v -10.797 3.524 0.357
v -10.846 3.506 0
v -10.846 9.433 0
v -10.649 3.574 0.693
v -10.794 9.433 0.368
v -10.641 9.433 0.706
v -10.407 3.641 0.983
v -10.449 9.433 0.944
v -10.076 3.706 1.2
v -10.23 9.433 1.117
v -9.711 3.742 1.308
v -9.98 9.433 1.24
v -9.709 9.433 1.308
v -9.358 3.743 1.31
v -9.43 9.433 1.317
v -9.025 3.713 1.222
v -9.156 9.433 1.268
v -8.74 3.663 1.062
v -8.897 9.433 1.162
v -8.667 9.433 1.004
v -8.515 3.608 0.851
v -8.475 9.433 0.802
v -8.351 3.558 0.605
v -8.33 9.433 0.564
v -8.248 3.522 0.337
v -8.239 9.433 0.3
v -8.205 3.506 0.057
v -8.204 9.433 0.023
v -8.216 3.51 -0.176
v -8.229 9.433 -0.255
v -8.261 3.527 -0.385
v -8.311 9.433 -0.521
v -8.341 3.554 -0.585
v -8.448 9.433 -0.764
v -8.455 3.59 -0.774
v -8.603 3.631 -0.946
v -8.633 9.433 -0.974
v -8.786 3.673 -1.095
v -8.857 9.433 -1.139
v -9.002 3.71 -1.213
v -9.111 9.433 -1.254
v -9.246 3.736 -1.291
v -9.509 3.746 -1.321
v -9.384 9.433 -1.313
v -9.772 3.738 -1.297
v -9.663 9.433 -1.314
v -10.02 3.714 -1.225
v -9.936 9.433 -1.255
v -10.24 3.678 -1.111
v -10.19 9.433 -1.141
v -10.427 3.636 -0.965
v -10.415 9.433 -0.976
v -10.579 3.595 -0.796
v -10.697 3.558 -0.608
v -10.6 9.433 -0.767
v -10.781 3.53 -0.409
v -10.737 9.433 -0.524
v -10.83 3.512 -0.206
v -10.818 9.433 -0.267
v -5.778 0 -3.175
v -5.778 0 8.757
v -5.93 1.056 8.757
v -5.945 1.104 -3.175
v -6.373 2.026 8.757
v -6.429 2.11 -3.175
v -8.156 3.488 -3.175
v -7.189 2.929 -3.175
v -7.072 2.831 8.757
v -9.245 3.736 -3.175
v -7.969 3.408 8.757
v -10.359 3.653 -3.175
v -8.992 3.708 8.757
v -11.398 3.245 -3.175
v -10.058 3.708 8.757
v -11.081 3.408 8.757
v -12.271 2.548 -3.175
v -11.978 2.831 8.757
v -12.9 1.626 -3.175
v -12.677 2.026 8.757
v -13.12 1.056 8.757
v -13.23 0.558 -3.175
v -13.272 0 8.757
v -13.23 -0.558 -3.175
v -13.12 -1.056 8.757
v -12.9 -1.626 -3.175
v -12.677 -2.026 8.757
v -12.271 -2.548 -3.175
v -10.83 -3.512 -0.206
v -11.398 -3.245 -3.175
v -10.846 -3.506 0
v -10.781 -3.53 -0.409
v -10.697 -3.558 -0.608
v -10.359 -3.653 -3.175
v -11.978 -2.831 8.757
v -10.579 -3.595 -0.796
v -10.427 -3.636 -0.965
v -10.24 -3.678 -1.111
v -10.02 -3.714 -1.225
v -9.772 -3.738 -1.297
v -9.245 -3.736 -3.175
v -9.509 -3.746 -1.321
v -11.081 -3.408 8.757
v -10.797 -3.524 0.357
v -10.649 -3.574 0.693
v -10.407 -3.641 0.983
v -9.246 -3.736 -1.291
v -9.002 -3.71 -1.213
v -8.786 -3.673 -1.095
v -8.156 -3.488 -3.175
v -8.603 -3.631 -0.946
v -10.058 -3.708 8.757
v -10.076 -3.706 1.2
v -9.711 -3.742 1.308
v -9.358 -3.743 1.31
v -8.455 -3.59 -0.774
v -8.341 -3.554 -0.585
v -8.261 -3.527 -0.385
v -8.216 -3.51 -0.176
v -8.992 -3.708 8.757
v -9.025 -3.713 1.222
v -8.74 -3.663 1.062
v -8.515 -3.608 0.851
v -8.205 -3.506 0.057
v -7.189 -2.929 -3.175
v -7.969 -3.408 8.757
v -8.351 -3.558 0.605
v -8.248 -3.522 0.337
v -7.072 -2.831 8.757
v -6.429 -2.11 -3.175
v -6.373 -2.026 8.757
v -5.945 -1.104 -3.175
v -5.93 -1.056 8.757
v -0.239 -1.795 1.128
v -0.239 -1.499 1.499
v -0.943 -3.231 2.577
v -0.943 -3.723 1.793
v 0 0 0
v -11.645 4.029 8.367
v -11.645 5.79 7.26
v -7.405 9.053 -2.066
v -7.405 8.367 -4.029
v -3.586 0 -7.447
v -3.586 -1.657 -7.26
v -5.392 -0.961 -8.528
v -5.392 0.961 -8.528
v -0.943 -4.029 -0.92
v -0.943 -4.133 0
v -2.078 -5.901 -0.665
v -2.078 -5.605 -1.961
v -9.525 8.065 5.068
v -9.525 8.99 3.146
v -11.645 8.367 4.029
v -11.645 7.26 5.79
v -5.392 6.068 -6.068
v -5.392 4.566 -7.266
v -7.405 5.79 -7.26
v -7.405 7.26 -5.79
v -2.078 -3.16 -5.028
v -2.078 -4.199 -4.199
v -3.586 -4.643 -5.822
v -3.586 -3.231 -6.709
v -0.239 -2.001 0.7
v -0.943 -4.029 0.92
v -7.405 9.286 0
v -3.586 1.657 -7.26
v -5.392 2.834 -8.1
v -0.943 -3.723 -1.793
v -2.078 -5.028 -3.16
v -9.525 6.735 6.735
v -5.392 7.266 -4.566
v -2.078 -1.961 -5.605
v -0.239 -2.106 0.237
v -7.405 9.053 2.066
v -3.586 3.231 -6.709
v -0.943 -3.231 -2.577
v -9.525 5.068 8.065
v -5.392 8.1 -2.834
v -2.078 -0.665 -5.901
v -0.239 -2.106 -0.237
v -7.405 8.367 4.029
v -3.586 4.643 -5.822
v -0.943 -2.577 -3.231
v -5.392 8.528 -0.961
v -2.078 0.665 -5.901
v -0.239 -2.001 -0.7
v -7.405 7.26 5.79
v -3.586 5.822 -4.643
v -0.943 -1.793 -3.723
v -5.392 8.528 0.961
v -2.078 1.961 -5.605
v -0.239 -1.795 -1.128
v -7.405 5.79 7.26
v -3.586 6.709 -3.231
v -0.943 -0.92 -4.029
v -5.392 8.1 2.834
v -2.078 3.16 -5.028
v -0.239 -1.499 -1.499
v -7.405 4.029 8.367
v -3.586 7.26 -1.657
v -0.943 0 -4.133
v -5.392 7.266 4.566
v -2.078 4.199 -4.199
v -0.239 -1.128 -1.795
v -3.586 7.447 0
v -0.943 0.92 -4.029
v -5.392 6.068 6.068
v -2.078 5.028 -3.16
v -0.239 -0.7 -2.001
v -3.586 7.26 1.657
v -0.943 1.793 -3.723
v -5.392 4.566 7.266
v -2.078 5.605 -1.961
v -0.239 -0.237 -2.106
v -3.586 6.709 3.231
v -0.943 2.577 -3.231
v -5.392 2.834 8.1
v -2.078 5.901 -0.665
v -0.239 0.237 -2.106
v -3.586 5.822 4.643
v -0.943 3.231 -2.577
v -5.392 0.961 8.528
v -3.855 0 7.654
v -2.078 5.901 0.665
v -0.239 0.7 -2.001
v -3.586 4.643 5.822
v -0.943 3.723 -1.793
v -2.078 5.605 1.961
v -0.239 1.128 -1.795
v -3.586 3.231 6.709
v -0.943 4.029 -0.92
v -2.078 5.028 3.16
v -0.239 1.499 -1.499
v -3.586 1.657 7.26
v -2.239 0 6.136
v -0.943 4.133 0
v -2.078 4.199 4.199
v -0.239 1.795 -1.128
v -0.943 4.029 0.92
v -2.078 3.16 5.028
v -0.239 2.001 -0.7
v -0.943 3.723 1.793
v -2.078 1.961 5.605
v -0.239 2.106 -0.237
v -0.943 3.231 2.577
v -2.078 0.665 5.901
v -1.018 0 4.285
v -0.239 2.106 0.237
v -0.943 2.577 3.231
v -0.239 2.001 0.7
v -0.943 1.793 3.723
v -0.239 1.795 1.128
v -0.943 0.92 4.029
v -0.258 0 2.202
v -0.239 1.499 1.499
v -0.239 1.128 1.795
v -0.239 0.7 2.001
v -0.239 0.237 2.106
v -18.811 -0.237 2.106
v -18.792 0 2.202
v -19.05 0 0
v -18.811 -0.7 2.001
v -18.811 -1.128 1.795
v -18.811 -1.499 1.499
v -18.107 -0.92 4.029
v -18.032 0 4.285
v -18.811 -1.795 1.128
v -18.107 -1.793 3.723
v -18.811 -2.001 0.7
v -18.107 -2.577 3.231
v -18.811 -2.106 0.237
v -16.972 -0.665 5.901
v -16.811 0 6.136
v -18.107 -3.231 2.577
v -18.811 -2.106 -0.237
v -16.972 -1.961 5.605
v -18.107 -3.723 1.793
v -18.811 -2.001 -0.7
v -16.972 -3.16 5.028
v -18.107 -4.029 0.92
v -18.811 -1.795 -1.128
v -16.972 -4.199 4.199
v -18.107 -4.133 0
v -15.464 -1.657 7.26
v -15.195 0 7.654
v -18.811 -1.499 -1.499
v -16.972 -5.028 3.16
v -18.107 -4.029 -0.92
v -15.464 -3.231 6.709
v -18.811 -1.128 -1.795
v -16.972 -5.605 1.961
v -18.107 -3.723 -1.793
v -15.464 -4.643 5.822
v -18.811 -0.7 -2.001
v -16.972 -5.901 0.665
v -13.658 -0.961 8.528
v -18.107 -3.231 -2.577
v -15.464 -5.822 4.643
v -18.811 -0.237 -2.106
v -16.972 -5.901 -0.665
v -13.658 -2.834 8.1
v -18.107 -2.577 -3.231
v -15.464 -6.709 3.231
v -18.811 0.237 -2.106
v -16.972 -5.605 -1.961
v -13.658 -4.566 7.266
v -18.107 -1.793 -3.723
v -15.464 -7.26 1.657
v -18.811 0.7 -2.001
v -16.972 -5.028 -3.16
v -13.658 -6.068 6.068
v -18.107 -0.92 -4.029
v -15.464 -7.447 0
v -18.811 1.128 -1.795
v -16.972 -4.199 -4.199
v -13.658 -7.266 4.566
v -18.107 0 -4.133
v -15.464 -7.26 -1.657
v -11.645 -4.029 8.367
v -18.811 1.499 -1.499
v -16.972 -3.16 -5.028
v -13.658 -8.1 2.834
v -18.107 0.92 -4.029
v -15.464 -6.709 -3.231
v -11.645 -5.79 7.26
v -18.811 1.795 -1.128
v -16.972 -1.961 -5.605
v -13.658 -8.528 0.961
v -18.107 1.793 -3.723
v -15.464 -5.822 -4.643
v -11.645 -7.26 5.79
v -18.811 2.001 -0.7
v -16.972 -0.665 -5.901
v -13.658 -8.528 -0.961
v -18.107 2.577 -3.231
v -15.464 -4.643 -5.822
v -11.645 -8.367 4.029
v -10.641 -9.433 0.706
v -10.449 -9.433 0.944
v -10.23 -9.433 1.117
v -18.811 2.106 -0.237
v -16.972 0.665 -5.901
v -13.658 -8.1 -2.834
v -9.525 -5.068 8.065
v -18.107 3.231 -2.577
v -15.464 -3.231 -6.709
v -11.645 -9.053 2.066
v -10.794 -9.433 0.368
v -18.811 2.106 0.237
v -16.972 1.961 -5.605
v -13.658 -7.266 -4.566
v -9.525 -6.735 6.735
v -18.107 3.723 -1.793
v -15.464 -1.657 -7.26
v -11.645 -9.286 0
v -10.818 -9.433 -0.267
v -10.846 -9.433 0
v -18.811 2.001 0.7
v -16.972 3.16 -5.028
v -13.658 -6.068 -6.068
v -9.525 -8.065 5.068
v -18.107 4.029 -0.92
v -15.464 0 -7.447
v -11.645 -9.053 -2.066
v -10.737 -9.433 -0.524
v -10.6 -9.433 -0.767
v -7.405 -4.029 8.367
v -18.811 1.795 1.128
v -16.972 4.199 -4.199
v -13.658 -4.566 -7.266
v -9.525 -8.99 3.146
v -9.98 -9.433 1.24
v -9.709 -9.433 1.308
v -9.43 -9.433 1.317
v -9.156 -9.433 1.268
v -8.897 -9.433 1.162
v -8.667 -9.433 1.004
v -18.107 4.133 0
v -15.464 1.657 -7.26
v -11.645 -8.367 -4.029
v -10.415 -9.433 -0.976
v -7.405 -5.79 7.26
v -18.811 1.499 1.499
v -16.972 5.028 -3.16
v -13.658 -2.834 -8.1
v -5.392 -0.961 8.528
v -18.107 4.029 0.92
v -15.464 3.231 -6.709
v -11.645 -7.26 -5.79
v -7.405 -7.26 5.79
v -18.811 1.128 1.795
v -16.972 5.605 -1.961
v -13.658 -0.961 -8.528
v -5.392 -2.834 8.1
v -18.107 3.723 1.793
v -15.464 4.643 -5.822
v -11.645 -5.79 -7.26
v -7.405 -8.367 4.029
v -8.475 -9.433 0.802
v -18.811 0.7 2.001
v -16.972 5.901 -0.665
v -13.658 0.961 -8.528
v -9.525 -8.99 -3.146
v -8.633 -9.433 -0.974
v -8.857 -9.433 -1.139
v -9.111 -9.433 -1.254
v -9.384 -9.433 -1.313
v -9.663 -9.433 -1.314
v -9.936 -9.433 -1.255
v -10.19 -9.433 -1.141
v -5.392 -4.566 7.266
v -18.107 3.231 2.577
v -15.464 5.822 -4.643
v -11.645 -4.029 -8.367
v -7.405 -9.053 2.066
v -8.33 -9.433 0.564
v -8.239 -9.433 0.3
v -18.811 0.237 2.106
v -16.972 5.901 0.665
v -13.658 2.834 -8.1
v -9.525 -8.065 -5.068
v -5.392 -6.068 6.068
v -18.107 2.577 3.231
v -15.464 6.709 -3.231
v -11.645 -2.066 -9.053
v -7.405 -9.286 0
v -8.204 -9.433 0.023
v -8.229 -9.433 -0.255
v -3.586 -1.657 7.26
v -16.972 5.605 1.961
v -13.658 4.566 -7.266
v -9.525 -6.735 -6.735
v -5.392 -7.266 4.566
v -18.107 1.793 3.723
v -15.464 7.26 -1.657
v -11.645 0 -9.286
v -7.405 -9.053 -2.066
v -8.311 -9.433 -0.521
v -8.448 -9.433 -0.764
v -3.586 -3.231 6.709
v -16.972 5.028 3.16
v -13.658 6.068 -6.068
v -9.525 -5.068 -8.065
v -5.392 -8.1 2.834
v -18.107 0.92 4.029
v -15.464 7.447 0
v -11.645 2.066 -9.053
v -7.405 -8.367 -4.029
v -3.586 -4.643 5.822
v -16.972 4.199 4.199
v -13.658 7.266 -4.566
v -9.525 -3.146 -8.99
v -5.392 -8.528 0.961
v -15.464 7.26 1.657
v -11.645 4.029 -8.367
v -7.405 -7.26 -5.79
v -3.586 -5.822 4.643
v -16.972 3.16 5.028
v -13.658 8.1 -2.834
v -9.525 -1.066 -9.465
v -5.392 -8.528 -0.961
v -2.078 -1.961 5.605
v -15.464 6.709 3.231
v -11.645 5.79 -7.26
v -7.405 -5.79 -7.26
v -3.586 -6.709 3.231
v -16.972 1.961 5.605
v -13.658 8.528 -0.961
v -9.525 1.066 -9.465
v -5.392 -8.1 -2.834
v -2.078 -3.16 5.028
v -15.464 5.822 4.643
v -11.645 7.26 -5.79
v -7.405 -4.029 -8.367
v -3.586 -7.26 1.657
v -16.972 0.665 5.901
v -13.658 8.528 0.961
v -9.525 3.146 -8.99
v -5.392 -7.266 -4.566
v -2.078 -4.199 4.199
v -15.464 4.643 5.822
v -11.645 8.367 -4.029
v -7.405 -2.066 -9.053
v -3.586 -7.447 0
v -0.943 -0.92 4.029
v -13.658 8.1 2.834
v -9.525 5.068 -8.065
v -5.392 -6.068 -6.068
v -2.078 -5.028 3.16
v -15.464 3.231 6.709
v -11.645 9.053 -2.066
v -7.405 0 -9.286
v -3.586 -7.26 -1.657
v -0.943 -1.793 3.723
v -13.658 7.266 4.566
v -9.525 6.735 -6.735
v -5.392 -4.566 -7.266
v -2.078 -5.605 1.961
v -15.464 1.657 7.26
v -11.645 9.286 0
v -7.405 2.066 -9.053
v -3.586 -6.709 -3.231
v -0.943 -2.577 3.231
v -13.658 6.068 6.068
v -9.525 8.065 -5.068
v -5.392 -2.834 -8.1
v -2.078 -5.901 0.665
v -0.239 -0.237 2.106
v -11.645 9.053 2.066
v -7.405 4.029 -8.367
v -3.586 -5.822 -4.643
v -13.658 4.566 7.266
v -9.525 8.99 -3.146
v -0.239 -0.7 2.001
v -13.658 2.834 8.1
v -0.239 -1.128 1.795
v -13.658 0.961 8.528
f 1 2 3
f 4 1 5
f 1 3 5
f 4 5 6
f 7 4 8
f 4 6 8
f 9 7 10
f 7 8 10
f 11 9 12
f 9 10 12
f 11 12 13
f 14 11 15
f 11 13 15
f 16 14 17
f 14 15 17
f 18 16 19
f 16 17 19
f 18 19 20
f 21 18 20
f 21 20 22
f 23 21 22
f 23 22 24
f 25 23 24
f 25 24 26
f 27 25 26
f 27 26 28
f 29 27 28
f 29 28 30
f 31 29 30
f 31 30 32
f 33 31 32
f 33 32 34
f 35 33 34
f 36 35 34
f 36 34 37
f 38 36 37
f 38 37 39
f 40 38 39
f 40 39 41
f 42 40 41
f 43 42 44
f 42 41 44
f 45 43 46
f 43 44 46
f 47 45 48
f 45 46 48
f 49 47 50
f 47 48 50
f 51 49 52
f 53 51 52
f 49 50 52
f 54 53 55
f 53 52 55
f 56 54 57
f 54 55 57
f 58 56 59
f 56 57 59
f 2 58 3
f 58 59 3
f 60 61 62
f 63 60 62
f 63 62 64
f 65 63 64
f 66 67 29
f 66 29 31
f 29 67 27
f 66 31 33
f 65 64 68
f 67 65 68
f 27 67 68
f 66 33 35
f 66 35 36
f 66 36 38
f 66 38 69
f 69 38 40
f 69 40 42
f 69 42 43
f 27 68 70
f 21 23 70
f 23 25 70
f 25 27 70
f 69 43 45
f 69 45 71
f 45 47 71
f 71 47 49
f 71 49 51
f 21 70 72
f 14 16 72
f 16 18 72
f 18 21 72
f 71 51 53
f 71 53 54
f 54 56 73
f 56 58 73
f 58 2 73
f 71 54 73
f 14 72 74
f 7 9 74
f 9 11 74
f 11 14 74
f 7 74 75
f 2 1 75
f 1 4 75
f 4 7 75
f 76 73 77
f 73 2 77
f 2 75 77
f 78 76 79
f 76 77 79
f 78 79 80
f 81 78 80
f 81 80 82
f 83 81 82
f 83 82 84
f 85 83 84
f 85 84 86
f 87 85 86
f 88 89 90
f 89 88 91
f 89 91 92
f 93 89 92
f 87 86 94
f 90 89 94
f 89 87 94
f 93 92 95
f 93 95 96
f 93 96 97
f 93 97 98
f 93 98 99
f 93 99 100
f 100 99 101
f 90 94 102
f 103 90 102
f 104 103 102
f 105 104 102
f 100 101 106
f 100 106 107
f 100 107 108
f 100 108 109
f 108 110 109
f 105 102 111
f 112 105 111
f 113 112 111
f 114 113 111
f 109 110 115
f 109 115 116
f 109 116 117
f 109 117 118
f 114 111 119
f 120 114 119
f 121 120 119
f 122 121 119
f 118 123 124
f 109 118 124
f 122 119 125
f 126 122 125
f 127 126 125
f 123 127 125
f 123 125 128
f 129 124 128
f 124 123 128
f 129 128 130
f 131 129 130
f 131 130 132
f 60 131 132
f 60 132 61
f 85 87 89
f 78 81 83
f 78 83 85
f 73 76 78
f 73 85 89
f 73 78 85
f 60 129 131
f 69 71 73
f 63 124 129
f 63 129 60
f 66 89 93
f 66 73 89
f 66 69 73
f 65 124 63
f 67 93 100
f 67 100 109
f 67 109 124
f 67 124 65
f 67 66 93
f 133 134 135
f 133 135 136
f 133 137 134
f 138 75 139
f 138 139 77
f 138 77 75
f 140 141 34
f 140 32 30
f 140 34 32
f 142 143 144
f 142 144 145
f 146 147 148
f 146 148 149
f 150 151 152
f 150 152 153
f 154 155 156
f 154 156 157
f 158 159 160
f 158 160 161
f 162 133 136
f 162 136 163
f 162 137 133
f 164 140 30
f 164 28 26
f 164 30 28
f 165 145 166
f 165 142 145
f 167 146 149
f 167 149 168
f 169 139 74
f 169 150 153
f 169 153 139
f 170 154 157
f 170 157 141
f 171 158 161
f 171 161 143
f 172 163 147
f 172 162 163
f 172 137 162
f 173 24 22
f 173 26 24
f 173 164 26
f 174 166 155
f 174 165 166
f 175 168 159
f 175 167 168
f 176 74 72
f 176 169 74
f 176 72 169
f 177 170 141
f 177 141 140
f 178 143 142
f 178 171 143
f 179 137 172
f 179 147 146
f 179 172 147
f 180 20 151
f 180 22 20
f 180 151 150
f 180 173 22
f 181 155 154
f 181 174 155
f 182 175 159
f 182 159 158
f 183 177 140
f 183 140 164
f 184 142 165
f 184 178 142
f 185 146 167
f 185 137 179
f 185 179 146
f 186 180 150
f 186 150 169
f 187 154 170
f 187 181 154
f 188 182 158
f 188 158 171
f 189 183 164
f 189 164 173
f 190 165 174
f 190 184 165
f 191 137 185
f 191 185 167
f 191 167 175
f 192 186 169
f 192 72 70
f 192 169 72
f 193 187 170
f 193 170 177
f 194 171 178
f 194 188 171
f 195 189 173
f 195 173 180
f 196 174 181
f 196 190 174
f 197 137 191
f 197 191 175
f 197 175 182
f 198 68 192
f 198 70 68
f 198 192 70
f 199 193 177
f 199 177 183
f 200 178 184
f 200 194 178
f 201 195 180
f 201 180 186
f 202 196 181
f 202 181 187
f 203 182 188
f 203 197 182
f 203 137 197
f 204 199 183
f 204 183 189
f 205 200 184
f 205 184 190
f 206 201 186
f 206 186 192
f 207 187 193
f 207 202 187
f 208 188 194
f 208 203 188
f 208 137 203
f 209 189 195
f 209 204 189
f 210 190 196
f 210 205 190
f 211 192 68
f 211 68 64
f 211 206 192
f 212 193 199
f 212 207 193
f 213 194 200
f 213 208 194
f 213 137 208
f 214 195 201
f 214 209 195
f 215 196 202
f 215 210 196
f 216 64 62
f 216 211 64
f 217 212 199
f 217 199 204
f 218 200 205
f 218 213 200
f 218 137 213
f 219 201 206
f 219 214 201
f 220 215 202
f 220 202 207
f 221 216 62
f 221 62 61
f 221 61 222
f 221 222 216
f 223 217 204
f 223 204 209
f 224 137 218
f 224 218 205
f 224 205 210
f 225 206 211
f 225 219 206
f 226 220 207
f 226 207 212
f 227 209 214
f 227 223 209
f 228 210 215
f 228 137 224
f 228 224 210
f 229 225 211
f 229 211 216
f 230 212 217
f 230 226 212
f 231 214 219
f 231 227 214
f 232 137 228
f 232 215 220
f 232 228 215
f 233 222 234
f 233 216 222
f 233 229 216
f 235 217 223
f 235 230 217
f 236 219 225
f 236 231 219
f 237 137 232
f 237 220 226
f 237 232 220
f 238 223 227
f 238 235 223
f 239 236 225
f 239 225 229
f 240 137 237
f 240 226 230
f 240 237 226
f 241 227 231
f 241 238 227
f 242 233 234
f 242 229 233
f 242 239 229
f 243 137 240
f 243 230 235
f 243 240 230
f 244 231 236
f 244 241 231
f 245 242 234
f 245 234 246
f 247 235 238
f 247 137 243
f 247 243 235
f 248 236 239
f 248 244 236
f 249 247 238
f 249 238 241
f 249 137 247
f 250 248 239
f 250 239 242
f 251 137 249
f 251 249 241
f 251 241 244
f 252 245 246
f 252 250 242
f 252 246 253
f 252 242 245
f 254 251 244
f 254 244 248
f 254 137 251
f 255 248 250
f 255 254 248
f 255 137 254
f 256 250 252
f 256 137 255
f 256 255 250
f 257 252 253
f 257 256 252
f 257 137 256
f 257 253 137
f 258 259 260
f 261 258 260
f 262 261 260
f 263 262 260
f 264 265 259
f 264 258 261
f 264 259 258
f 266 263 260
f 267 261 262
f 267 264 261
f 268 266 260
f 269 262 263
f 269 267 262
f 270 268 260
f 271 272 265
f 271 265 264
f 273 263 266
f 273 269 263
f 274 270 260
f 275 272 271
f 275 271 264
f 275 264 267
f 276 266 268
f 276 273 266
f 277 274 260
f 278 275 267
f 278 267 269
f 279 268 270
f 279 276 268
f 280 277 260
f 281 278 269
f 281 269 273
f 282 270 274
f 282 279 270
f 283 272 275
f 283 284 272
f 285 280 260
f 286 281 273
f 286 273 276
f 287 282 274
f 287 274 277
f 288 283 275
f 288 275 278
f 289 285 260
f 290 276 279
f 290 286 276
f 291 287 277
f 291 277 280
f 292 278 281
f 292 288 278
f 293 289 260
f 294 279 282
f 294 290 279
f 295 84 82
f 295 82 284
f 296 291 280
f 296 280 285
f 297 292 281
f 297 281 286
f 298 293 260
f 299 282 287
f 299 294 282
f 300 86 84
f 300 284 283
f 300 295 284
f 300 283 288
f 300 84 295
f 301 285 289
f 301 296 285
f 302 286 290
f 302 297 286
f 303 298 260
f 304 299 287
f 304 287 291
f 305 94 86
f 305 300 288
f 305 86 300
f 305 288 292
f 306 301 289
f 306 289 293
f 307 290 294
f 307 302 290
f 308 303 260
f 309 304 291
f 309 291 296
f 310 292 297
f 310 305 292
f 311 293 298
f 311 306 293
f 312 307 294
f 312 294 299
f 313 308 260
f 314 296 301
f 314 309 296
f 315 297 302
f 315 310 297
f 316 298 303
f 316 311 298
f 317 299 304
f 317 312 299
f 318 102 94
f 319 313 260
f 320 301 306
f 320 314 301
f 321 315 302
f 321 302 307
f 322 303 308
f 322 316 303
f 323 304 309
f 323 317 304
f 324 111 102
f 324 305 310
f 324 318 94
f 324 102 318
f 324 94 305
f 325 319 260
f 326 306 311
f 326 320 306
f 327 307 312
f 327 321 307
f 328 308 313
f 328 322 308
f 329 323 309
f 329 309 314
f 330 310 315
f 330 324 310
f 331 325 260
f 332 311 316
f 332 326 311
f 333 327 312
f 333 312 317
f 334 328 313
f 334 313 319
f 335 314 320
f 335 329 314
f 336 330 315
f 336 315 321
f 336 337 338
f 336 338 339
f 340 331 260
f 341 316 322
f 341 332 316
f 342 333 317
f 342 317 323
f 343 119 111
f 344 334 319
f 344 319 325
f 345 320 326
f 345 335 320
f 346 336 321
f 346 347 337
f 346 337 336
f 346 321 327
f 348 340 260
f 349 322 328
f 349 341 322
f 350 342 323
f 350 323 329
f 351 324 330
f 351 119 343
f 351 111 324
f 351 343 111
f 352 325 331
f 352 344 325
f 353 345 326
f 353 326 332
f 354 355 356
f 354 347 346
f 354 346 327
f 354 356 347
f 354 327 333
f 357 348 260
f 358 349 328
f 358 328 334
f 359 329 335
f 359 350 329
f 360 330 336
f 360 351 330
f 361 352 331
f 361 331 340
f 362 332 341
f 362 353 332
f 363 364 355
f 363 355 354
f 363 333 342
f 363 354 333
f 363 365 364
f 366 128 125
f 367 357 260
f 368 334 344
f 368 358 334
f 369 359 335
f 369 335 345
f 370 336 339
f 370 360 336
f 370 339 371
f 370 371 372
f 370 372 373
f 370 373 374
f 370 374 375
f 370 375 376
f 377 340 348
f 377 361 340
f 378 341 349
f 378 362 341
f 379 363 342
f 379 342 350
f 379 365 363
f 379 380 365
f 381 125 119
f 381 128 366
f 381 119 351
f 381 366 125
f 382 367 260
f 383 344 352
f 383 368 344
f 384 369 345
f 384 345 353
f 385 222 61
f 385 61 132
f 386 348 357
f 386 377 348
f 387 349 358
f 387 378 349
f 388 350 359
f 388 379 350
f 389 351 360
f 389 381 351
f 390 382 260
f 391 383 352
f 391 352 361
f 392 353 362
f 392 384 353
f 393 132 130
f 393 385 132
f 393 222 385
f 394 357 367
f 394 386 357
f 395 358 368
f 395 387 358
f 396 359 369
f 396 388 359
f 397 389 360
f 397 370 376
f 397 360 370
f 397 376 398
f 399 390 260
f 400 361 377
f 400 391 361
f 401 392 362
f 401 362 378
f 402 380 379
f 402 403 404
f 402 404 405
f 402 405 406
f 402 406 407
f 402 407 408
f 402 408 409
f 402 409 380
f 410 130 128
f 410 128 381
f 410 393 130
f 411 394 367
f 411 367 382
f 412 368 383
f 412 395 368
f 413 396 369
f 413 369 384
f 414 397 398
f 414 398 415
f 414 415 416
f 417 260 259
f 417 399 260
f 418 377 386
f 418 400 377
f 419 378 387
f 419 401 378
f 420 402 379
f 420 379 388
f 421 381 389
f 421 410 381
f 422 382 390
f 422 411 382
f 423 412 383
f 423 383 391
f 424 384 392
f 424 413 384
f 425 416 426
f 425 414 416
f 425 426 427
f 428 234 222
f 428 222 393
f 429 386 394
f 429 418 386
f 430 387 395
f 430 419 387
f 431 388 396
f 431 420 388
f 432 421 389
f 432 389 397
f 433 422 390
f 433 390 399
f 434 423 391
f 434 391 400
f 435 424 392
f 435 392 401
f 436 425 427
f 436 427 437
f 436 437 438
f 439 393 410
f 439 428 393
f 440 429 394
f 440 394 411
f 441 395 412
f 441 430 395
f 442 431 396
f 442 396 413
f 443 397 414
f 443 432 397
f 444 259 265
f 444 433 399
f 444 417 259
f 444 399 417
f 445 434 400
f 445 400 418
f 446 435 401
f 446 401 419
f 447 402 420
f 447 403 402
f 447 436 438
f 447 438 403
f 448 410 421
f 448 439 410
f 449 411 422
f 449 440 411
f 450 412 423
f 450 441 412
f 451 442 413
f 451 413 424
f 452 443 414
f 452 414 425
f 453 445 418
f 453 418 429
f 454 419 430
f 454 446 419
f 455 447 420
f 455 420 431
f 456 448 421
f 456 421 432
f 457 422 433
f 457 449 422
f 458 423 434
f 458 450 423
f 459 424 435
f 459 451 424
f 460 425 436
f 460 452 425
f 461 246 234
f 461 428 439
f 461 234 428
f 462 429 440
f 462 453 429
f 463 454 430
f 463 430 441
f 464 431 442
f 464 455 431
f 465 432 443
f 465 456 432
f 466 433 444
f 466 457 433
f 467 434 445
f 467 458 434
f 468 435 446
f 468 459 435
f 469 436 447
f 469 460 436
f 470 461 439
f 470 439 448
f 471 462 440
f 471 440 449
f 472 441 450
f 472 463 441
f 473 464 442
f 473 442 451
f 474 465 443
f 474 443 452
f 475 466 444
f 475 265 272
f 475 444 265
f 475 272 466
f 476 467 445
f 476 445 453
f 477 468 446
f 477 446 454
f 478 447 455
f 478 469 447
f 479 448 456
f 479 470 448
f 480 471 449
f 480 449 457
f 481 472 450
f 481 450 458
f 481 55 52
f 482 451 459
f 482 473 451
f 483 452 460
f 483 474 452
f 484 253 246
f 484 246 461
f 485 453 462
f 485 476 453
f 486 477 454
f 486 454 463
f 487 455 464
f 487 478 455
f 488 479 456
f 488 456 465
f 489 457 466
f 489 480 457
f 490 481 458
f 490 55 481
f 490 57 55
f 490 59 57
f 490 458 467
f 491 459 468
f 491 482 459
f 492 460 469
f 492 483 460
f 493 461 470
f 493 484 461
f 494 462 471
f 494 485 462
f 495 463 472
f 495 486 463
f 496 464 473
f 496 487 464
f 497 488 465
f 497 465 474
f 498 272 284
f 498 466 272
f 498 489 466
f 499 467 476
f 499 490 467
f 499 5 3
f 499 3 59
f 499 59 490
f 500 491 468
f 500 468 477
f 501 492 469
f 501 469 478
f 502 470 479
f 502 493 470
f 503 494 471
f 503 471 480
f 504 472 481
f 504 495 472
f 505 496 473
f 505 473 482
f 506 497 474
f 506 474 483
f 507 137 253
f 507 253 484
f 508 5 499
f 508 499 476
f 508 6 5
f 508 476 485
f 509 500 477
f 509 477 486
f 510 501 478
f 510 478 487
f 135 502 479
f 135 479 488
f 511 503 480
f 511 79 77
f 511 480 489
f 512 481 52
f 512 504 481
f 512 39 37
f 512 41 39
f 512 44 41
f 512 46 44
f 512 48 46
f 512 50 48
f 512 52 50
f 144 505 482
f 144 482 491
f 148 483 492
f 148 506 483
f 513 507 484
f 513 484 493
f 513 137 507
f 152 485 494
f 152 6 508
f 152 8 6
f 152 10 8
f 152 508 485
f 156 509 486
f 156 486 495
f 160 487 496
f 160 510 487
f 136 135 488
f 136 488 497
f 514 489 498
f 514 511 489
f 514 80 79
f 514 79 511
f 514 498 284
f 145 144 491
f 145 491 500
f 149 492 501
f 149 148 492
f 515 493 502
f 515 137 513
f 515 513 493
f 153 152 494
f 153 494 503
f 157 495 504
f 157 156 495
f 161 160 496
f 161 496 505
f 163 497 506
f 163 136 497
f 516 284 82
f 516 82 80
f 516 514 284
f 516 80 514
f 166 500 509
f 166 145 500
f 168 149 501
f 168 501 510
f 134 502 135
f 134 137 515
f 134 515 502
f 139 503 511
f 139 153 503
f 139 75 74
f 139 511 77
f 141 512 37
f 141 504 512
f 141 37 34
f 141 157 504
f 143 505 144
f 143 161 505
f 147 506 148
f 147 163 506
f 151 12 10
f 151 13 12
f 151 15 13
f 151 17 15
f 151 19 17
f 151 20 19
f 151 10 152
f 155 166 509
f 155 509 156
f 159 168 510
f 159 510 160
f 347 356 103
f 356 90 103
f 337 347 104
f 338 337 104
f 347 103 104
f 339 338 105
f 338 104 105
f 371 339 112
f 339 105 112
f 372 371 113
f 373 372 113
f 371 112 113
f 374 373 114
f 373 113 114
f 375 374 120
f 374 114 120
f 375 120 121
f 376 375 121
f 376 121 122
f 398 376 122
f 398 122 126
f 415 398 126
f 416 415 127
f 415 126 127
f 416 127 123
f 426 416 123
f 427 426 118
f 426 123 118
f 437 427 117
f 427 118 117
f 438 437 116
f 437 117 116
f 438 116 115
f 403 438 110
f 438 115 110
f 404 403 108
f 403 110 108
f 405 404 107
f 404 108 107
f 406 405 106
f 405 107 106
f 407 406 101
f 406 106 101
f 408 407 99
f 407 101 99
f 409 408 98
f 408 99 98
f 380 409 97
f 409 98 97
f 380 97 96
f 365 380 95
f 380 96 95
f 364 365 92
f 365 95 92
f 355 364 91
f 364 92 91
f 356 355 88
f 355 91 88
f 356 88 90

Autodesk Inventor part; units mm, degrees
ref_plane "YZ Plane" through (0, 0, 0) normal (1, 0, 0) x (0, 1, 0)
sketch "Sketch1" plane through (0, 0, 0) normal (0, 1, 0) x (-1, 0, 0)
  line L0 (0, 0) -> (19.05, 0)
  arc A0 (19.05, 0) -> (0, 0) centre (9.525, 0) ccw
  dimension "d0" = 19.05
revolve "Revolution1" add sketch "Sketch1" angle 360 about axis through (0, 0, 0) along (-1, 0, 0)
ref_plane "Work Plane1" through (-9.525, 9.525, 0) normal (0, 1, 0) x (-1, 0, 0)
ref_plane "Work Plane2" through (0, 0, 9.525) normal (0, 0, 1) x (1, 0, 0)
sketch "Sketch5" plane through (-9.525, 9.525, 0) normal (0, 1, 0) x (-1, 0, 0)
  circle A0 centre (0, 0) radius 1.3208
  point P0 (-9.525, 0)
  dimension "d19" = 2.6416
  dimension "d20" = 9.525
extrude "Extrusion1" cut sketch "Sketch5" against normal through all
sketch "Sketch6" plane through (0, 0, 9.525) normal (0, 0, 1) x (1, 0, 0)
  circle A0 centre (-9.525, 0) radius 3.7465
  point P0 (0, 0)
  dimension "d23" = 9.525
  dimension "d24" = 7.493
extrude "Extrusion2" cut sketch "Sketch6" against normal blind 12.7
properties part number "VS-008 (HANDLE BALL)" material "Steel, Carbon"
